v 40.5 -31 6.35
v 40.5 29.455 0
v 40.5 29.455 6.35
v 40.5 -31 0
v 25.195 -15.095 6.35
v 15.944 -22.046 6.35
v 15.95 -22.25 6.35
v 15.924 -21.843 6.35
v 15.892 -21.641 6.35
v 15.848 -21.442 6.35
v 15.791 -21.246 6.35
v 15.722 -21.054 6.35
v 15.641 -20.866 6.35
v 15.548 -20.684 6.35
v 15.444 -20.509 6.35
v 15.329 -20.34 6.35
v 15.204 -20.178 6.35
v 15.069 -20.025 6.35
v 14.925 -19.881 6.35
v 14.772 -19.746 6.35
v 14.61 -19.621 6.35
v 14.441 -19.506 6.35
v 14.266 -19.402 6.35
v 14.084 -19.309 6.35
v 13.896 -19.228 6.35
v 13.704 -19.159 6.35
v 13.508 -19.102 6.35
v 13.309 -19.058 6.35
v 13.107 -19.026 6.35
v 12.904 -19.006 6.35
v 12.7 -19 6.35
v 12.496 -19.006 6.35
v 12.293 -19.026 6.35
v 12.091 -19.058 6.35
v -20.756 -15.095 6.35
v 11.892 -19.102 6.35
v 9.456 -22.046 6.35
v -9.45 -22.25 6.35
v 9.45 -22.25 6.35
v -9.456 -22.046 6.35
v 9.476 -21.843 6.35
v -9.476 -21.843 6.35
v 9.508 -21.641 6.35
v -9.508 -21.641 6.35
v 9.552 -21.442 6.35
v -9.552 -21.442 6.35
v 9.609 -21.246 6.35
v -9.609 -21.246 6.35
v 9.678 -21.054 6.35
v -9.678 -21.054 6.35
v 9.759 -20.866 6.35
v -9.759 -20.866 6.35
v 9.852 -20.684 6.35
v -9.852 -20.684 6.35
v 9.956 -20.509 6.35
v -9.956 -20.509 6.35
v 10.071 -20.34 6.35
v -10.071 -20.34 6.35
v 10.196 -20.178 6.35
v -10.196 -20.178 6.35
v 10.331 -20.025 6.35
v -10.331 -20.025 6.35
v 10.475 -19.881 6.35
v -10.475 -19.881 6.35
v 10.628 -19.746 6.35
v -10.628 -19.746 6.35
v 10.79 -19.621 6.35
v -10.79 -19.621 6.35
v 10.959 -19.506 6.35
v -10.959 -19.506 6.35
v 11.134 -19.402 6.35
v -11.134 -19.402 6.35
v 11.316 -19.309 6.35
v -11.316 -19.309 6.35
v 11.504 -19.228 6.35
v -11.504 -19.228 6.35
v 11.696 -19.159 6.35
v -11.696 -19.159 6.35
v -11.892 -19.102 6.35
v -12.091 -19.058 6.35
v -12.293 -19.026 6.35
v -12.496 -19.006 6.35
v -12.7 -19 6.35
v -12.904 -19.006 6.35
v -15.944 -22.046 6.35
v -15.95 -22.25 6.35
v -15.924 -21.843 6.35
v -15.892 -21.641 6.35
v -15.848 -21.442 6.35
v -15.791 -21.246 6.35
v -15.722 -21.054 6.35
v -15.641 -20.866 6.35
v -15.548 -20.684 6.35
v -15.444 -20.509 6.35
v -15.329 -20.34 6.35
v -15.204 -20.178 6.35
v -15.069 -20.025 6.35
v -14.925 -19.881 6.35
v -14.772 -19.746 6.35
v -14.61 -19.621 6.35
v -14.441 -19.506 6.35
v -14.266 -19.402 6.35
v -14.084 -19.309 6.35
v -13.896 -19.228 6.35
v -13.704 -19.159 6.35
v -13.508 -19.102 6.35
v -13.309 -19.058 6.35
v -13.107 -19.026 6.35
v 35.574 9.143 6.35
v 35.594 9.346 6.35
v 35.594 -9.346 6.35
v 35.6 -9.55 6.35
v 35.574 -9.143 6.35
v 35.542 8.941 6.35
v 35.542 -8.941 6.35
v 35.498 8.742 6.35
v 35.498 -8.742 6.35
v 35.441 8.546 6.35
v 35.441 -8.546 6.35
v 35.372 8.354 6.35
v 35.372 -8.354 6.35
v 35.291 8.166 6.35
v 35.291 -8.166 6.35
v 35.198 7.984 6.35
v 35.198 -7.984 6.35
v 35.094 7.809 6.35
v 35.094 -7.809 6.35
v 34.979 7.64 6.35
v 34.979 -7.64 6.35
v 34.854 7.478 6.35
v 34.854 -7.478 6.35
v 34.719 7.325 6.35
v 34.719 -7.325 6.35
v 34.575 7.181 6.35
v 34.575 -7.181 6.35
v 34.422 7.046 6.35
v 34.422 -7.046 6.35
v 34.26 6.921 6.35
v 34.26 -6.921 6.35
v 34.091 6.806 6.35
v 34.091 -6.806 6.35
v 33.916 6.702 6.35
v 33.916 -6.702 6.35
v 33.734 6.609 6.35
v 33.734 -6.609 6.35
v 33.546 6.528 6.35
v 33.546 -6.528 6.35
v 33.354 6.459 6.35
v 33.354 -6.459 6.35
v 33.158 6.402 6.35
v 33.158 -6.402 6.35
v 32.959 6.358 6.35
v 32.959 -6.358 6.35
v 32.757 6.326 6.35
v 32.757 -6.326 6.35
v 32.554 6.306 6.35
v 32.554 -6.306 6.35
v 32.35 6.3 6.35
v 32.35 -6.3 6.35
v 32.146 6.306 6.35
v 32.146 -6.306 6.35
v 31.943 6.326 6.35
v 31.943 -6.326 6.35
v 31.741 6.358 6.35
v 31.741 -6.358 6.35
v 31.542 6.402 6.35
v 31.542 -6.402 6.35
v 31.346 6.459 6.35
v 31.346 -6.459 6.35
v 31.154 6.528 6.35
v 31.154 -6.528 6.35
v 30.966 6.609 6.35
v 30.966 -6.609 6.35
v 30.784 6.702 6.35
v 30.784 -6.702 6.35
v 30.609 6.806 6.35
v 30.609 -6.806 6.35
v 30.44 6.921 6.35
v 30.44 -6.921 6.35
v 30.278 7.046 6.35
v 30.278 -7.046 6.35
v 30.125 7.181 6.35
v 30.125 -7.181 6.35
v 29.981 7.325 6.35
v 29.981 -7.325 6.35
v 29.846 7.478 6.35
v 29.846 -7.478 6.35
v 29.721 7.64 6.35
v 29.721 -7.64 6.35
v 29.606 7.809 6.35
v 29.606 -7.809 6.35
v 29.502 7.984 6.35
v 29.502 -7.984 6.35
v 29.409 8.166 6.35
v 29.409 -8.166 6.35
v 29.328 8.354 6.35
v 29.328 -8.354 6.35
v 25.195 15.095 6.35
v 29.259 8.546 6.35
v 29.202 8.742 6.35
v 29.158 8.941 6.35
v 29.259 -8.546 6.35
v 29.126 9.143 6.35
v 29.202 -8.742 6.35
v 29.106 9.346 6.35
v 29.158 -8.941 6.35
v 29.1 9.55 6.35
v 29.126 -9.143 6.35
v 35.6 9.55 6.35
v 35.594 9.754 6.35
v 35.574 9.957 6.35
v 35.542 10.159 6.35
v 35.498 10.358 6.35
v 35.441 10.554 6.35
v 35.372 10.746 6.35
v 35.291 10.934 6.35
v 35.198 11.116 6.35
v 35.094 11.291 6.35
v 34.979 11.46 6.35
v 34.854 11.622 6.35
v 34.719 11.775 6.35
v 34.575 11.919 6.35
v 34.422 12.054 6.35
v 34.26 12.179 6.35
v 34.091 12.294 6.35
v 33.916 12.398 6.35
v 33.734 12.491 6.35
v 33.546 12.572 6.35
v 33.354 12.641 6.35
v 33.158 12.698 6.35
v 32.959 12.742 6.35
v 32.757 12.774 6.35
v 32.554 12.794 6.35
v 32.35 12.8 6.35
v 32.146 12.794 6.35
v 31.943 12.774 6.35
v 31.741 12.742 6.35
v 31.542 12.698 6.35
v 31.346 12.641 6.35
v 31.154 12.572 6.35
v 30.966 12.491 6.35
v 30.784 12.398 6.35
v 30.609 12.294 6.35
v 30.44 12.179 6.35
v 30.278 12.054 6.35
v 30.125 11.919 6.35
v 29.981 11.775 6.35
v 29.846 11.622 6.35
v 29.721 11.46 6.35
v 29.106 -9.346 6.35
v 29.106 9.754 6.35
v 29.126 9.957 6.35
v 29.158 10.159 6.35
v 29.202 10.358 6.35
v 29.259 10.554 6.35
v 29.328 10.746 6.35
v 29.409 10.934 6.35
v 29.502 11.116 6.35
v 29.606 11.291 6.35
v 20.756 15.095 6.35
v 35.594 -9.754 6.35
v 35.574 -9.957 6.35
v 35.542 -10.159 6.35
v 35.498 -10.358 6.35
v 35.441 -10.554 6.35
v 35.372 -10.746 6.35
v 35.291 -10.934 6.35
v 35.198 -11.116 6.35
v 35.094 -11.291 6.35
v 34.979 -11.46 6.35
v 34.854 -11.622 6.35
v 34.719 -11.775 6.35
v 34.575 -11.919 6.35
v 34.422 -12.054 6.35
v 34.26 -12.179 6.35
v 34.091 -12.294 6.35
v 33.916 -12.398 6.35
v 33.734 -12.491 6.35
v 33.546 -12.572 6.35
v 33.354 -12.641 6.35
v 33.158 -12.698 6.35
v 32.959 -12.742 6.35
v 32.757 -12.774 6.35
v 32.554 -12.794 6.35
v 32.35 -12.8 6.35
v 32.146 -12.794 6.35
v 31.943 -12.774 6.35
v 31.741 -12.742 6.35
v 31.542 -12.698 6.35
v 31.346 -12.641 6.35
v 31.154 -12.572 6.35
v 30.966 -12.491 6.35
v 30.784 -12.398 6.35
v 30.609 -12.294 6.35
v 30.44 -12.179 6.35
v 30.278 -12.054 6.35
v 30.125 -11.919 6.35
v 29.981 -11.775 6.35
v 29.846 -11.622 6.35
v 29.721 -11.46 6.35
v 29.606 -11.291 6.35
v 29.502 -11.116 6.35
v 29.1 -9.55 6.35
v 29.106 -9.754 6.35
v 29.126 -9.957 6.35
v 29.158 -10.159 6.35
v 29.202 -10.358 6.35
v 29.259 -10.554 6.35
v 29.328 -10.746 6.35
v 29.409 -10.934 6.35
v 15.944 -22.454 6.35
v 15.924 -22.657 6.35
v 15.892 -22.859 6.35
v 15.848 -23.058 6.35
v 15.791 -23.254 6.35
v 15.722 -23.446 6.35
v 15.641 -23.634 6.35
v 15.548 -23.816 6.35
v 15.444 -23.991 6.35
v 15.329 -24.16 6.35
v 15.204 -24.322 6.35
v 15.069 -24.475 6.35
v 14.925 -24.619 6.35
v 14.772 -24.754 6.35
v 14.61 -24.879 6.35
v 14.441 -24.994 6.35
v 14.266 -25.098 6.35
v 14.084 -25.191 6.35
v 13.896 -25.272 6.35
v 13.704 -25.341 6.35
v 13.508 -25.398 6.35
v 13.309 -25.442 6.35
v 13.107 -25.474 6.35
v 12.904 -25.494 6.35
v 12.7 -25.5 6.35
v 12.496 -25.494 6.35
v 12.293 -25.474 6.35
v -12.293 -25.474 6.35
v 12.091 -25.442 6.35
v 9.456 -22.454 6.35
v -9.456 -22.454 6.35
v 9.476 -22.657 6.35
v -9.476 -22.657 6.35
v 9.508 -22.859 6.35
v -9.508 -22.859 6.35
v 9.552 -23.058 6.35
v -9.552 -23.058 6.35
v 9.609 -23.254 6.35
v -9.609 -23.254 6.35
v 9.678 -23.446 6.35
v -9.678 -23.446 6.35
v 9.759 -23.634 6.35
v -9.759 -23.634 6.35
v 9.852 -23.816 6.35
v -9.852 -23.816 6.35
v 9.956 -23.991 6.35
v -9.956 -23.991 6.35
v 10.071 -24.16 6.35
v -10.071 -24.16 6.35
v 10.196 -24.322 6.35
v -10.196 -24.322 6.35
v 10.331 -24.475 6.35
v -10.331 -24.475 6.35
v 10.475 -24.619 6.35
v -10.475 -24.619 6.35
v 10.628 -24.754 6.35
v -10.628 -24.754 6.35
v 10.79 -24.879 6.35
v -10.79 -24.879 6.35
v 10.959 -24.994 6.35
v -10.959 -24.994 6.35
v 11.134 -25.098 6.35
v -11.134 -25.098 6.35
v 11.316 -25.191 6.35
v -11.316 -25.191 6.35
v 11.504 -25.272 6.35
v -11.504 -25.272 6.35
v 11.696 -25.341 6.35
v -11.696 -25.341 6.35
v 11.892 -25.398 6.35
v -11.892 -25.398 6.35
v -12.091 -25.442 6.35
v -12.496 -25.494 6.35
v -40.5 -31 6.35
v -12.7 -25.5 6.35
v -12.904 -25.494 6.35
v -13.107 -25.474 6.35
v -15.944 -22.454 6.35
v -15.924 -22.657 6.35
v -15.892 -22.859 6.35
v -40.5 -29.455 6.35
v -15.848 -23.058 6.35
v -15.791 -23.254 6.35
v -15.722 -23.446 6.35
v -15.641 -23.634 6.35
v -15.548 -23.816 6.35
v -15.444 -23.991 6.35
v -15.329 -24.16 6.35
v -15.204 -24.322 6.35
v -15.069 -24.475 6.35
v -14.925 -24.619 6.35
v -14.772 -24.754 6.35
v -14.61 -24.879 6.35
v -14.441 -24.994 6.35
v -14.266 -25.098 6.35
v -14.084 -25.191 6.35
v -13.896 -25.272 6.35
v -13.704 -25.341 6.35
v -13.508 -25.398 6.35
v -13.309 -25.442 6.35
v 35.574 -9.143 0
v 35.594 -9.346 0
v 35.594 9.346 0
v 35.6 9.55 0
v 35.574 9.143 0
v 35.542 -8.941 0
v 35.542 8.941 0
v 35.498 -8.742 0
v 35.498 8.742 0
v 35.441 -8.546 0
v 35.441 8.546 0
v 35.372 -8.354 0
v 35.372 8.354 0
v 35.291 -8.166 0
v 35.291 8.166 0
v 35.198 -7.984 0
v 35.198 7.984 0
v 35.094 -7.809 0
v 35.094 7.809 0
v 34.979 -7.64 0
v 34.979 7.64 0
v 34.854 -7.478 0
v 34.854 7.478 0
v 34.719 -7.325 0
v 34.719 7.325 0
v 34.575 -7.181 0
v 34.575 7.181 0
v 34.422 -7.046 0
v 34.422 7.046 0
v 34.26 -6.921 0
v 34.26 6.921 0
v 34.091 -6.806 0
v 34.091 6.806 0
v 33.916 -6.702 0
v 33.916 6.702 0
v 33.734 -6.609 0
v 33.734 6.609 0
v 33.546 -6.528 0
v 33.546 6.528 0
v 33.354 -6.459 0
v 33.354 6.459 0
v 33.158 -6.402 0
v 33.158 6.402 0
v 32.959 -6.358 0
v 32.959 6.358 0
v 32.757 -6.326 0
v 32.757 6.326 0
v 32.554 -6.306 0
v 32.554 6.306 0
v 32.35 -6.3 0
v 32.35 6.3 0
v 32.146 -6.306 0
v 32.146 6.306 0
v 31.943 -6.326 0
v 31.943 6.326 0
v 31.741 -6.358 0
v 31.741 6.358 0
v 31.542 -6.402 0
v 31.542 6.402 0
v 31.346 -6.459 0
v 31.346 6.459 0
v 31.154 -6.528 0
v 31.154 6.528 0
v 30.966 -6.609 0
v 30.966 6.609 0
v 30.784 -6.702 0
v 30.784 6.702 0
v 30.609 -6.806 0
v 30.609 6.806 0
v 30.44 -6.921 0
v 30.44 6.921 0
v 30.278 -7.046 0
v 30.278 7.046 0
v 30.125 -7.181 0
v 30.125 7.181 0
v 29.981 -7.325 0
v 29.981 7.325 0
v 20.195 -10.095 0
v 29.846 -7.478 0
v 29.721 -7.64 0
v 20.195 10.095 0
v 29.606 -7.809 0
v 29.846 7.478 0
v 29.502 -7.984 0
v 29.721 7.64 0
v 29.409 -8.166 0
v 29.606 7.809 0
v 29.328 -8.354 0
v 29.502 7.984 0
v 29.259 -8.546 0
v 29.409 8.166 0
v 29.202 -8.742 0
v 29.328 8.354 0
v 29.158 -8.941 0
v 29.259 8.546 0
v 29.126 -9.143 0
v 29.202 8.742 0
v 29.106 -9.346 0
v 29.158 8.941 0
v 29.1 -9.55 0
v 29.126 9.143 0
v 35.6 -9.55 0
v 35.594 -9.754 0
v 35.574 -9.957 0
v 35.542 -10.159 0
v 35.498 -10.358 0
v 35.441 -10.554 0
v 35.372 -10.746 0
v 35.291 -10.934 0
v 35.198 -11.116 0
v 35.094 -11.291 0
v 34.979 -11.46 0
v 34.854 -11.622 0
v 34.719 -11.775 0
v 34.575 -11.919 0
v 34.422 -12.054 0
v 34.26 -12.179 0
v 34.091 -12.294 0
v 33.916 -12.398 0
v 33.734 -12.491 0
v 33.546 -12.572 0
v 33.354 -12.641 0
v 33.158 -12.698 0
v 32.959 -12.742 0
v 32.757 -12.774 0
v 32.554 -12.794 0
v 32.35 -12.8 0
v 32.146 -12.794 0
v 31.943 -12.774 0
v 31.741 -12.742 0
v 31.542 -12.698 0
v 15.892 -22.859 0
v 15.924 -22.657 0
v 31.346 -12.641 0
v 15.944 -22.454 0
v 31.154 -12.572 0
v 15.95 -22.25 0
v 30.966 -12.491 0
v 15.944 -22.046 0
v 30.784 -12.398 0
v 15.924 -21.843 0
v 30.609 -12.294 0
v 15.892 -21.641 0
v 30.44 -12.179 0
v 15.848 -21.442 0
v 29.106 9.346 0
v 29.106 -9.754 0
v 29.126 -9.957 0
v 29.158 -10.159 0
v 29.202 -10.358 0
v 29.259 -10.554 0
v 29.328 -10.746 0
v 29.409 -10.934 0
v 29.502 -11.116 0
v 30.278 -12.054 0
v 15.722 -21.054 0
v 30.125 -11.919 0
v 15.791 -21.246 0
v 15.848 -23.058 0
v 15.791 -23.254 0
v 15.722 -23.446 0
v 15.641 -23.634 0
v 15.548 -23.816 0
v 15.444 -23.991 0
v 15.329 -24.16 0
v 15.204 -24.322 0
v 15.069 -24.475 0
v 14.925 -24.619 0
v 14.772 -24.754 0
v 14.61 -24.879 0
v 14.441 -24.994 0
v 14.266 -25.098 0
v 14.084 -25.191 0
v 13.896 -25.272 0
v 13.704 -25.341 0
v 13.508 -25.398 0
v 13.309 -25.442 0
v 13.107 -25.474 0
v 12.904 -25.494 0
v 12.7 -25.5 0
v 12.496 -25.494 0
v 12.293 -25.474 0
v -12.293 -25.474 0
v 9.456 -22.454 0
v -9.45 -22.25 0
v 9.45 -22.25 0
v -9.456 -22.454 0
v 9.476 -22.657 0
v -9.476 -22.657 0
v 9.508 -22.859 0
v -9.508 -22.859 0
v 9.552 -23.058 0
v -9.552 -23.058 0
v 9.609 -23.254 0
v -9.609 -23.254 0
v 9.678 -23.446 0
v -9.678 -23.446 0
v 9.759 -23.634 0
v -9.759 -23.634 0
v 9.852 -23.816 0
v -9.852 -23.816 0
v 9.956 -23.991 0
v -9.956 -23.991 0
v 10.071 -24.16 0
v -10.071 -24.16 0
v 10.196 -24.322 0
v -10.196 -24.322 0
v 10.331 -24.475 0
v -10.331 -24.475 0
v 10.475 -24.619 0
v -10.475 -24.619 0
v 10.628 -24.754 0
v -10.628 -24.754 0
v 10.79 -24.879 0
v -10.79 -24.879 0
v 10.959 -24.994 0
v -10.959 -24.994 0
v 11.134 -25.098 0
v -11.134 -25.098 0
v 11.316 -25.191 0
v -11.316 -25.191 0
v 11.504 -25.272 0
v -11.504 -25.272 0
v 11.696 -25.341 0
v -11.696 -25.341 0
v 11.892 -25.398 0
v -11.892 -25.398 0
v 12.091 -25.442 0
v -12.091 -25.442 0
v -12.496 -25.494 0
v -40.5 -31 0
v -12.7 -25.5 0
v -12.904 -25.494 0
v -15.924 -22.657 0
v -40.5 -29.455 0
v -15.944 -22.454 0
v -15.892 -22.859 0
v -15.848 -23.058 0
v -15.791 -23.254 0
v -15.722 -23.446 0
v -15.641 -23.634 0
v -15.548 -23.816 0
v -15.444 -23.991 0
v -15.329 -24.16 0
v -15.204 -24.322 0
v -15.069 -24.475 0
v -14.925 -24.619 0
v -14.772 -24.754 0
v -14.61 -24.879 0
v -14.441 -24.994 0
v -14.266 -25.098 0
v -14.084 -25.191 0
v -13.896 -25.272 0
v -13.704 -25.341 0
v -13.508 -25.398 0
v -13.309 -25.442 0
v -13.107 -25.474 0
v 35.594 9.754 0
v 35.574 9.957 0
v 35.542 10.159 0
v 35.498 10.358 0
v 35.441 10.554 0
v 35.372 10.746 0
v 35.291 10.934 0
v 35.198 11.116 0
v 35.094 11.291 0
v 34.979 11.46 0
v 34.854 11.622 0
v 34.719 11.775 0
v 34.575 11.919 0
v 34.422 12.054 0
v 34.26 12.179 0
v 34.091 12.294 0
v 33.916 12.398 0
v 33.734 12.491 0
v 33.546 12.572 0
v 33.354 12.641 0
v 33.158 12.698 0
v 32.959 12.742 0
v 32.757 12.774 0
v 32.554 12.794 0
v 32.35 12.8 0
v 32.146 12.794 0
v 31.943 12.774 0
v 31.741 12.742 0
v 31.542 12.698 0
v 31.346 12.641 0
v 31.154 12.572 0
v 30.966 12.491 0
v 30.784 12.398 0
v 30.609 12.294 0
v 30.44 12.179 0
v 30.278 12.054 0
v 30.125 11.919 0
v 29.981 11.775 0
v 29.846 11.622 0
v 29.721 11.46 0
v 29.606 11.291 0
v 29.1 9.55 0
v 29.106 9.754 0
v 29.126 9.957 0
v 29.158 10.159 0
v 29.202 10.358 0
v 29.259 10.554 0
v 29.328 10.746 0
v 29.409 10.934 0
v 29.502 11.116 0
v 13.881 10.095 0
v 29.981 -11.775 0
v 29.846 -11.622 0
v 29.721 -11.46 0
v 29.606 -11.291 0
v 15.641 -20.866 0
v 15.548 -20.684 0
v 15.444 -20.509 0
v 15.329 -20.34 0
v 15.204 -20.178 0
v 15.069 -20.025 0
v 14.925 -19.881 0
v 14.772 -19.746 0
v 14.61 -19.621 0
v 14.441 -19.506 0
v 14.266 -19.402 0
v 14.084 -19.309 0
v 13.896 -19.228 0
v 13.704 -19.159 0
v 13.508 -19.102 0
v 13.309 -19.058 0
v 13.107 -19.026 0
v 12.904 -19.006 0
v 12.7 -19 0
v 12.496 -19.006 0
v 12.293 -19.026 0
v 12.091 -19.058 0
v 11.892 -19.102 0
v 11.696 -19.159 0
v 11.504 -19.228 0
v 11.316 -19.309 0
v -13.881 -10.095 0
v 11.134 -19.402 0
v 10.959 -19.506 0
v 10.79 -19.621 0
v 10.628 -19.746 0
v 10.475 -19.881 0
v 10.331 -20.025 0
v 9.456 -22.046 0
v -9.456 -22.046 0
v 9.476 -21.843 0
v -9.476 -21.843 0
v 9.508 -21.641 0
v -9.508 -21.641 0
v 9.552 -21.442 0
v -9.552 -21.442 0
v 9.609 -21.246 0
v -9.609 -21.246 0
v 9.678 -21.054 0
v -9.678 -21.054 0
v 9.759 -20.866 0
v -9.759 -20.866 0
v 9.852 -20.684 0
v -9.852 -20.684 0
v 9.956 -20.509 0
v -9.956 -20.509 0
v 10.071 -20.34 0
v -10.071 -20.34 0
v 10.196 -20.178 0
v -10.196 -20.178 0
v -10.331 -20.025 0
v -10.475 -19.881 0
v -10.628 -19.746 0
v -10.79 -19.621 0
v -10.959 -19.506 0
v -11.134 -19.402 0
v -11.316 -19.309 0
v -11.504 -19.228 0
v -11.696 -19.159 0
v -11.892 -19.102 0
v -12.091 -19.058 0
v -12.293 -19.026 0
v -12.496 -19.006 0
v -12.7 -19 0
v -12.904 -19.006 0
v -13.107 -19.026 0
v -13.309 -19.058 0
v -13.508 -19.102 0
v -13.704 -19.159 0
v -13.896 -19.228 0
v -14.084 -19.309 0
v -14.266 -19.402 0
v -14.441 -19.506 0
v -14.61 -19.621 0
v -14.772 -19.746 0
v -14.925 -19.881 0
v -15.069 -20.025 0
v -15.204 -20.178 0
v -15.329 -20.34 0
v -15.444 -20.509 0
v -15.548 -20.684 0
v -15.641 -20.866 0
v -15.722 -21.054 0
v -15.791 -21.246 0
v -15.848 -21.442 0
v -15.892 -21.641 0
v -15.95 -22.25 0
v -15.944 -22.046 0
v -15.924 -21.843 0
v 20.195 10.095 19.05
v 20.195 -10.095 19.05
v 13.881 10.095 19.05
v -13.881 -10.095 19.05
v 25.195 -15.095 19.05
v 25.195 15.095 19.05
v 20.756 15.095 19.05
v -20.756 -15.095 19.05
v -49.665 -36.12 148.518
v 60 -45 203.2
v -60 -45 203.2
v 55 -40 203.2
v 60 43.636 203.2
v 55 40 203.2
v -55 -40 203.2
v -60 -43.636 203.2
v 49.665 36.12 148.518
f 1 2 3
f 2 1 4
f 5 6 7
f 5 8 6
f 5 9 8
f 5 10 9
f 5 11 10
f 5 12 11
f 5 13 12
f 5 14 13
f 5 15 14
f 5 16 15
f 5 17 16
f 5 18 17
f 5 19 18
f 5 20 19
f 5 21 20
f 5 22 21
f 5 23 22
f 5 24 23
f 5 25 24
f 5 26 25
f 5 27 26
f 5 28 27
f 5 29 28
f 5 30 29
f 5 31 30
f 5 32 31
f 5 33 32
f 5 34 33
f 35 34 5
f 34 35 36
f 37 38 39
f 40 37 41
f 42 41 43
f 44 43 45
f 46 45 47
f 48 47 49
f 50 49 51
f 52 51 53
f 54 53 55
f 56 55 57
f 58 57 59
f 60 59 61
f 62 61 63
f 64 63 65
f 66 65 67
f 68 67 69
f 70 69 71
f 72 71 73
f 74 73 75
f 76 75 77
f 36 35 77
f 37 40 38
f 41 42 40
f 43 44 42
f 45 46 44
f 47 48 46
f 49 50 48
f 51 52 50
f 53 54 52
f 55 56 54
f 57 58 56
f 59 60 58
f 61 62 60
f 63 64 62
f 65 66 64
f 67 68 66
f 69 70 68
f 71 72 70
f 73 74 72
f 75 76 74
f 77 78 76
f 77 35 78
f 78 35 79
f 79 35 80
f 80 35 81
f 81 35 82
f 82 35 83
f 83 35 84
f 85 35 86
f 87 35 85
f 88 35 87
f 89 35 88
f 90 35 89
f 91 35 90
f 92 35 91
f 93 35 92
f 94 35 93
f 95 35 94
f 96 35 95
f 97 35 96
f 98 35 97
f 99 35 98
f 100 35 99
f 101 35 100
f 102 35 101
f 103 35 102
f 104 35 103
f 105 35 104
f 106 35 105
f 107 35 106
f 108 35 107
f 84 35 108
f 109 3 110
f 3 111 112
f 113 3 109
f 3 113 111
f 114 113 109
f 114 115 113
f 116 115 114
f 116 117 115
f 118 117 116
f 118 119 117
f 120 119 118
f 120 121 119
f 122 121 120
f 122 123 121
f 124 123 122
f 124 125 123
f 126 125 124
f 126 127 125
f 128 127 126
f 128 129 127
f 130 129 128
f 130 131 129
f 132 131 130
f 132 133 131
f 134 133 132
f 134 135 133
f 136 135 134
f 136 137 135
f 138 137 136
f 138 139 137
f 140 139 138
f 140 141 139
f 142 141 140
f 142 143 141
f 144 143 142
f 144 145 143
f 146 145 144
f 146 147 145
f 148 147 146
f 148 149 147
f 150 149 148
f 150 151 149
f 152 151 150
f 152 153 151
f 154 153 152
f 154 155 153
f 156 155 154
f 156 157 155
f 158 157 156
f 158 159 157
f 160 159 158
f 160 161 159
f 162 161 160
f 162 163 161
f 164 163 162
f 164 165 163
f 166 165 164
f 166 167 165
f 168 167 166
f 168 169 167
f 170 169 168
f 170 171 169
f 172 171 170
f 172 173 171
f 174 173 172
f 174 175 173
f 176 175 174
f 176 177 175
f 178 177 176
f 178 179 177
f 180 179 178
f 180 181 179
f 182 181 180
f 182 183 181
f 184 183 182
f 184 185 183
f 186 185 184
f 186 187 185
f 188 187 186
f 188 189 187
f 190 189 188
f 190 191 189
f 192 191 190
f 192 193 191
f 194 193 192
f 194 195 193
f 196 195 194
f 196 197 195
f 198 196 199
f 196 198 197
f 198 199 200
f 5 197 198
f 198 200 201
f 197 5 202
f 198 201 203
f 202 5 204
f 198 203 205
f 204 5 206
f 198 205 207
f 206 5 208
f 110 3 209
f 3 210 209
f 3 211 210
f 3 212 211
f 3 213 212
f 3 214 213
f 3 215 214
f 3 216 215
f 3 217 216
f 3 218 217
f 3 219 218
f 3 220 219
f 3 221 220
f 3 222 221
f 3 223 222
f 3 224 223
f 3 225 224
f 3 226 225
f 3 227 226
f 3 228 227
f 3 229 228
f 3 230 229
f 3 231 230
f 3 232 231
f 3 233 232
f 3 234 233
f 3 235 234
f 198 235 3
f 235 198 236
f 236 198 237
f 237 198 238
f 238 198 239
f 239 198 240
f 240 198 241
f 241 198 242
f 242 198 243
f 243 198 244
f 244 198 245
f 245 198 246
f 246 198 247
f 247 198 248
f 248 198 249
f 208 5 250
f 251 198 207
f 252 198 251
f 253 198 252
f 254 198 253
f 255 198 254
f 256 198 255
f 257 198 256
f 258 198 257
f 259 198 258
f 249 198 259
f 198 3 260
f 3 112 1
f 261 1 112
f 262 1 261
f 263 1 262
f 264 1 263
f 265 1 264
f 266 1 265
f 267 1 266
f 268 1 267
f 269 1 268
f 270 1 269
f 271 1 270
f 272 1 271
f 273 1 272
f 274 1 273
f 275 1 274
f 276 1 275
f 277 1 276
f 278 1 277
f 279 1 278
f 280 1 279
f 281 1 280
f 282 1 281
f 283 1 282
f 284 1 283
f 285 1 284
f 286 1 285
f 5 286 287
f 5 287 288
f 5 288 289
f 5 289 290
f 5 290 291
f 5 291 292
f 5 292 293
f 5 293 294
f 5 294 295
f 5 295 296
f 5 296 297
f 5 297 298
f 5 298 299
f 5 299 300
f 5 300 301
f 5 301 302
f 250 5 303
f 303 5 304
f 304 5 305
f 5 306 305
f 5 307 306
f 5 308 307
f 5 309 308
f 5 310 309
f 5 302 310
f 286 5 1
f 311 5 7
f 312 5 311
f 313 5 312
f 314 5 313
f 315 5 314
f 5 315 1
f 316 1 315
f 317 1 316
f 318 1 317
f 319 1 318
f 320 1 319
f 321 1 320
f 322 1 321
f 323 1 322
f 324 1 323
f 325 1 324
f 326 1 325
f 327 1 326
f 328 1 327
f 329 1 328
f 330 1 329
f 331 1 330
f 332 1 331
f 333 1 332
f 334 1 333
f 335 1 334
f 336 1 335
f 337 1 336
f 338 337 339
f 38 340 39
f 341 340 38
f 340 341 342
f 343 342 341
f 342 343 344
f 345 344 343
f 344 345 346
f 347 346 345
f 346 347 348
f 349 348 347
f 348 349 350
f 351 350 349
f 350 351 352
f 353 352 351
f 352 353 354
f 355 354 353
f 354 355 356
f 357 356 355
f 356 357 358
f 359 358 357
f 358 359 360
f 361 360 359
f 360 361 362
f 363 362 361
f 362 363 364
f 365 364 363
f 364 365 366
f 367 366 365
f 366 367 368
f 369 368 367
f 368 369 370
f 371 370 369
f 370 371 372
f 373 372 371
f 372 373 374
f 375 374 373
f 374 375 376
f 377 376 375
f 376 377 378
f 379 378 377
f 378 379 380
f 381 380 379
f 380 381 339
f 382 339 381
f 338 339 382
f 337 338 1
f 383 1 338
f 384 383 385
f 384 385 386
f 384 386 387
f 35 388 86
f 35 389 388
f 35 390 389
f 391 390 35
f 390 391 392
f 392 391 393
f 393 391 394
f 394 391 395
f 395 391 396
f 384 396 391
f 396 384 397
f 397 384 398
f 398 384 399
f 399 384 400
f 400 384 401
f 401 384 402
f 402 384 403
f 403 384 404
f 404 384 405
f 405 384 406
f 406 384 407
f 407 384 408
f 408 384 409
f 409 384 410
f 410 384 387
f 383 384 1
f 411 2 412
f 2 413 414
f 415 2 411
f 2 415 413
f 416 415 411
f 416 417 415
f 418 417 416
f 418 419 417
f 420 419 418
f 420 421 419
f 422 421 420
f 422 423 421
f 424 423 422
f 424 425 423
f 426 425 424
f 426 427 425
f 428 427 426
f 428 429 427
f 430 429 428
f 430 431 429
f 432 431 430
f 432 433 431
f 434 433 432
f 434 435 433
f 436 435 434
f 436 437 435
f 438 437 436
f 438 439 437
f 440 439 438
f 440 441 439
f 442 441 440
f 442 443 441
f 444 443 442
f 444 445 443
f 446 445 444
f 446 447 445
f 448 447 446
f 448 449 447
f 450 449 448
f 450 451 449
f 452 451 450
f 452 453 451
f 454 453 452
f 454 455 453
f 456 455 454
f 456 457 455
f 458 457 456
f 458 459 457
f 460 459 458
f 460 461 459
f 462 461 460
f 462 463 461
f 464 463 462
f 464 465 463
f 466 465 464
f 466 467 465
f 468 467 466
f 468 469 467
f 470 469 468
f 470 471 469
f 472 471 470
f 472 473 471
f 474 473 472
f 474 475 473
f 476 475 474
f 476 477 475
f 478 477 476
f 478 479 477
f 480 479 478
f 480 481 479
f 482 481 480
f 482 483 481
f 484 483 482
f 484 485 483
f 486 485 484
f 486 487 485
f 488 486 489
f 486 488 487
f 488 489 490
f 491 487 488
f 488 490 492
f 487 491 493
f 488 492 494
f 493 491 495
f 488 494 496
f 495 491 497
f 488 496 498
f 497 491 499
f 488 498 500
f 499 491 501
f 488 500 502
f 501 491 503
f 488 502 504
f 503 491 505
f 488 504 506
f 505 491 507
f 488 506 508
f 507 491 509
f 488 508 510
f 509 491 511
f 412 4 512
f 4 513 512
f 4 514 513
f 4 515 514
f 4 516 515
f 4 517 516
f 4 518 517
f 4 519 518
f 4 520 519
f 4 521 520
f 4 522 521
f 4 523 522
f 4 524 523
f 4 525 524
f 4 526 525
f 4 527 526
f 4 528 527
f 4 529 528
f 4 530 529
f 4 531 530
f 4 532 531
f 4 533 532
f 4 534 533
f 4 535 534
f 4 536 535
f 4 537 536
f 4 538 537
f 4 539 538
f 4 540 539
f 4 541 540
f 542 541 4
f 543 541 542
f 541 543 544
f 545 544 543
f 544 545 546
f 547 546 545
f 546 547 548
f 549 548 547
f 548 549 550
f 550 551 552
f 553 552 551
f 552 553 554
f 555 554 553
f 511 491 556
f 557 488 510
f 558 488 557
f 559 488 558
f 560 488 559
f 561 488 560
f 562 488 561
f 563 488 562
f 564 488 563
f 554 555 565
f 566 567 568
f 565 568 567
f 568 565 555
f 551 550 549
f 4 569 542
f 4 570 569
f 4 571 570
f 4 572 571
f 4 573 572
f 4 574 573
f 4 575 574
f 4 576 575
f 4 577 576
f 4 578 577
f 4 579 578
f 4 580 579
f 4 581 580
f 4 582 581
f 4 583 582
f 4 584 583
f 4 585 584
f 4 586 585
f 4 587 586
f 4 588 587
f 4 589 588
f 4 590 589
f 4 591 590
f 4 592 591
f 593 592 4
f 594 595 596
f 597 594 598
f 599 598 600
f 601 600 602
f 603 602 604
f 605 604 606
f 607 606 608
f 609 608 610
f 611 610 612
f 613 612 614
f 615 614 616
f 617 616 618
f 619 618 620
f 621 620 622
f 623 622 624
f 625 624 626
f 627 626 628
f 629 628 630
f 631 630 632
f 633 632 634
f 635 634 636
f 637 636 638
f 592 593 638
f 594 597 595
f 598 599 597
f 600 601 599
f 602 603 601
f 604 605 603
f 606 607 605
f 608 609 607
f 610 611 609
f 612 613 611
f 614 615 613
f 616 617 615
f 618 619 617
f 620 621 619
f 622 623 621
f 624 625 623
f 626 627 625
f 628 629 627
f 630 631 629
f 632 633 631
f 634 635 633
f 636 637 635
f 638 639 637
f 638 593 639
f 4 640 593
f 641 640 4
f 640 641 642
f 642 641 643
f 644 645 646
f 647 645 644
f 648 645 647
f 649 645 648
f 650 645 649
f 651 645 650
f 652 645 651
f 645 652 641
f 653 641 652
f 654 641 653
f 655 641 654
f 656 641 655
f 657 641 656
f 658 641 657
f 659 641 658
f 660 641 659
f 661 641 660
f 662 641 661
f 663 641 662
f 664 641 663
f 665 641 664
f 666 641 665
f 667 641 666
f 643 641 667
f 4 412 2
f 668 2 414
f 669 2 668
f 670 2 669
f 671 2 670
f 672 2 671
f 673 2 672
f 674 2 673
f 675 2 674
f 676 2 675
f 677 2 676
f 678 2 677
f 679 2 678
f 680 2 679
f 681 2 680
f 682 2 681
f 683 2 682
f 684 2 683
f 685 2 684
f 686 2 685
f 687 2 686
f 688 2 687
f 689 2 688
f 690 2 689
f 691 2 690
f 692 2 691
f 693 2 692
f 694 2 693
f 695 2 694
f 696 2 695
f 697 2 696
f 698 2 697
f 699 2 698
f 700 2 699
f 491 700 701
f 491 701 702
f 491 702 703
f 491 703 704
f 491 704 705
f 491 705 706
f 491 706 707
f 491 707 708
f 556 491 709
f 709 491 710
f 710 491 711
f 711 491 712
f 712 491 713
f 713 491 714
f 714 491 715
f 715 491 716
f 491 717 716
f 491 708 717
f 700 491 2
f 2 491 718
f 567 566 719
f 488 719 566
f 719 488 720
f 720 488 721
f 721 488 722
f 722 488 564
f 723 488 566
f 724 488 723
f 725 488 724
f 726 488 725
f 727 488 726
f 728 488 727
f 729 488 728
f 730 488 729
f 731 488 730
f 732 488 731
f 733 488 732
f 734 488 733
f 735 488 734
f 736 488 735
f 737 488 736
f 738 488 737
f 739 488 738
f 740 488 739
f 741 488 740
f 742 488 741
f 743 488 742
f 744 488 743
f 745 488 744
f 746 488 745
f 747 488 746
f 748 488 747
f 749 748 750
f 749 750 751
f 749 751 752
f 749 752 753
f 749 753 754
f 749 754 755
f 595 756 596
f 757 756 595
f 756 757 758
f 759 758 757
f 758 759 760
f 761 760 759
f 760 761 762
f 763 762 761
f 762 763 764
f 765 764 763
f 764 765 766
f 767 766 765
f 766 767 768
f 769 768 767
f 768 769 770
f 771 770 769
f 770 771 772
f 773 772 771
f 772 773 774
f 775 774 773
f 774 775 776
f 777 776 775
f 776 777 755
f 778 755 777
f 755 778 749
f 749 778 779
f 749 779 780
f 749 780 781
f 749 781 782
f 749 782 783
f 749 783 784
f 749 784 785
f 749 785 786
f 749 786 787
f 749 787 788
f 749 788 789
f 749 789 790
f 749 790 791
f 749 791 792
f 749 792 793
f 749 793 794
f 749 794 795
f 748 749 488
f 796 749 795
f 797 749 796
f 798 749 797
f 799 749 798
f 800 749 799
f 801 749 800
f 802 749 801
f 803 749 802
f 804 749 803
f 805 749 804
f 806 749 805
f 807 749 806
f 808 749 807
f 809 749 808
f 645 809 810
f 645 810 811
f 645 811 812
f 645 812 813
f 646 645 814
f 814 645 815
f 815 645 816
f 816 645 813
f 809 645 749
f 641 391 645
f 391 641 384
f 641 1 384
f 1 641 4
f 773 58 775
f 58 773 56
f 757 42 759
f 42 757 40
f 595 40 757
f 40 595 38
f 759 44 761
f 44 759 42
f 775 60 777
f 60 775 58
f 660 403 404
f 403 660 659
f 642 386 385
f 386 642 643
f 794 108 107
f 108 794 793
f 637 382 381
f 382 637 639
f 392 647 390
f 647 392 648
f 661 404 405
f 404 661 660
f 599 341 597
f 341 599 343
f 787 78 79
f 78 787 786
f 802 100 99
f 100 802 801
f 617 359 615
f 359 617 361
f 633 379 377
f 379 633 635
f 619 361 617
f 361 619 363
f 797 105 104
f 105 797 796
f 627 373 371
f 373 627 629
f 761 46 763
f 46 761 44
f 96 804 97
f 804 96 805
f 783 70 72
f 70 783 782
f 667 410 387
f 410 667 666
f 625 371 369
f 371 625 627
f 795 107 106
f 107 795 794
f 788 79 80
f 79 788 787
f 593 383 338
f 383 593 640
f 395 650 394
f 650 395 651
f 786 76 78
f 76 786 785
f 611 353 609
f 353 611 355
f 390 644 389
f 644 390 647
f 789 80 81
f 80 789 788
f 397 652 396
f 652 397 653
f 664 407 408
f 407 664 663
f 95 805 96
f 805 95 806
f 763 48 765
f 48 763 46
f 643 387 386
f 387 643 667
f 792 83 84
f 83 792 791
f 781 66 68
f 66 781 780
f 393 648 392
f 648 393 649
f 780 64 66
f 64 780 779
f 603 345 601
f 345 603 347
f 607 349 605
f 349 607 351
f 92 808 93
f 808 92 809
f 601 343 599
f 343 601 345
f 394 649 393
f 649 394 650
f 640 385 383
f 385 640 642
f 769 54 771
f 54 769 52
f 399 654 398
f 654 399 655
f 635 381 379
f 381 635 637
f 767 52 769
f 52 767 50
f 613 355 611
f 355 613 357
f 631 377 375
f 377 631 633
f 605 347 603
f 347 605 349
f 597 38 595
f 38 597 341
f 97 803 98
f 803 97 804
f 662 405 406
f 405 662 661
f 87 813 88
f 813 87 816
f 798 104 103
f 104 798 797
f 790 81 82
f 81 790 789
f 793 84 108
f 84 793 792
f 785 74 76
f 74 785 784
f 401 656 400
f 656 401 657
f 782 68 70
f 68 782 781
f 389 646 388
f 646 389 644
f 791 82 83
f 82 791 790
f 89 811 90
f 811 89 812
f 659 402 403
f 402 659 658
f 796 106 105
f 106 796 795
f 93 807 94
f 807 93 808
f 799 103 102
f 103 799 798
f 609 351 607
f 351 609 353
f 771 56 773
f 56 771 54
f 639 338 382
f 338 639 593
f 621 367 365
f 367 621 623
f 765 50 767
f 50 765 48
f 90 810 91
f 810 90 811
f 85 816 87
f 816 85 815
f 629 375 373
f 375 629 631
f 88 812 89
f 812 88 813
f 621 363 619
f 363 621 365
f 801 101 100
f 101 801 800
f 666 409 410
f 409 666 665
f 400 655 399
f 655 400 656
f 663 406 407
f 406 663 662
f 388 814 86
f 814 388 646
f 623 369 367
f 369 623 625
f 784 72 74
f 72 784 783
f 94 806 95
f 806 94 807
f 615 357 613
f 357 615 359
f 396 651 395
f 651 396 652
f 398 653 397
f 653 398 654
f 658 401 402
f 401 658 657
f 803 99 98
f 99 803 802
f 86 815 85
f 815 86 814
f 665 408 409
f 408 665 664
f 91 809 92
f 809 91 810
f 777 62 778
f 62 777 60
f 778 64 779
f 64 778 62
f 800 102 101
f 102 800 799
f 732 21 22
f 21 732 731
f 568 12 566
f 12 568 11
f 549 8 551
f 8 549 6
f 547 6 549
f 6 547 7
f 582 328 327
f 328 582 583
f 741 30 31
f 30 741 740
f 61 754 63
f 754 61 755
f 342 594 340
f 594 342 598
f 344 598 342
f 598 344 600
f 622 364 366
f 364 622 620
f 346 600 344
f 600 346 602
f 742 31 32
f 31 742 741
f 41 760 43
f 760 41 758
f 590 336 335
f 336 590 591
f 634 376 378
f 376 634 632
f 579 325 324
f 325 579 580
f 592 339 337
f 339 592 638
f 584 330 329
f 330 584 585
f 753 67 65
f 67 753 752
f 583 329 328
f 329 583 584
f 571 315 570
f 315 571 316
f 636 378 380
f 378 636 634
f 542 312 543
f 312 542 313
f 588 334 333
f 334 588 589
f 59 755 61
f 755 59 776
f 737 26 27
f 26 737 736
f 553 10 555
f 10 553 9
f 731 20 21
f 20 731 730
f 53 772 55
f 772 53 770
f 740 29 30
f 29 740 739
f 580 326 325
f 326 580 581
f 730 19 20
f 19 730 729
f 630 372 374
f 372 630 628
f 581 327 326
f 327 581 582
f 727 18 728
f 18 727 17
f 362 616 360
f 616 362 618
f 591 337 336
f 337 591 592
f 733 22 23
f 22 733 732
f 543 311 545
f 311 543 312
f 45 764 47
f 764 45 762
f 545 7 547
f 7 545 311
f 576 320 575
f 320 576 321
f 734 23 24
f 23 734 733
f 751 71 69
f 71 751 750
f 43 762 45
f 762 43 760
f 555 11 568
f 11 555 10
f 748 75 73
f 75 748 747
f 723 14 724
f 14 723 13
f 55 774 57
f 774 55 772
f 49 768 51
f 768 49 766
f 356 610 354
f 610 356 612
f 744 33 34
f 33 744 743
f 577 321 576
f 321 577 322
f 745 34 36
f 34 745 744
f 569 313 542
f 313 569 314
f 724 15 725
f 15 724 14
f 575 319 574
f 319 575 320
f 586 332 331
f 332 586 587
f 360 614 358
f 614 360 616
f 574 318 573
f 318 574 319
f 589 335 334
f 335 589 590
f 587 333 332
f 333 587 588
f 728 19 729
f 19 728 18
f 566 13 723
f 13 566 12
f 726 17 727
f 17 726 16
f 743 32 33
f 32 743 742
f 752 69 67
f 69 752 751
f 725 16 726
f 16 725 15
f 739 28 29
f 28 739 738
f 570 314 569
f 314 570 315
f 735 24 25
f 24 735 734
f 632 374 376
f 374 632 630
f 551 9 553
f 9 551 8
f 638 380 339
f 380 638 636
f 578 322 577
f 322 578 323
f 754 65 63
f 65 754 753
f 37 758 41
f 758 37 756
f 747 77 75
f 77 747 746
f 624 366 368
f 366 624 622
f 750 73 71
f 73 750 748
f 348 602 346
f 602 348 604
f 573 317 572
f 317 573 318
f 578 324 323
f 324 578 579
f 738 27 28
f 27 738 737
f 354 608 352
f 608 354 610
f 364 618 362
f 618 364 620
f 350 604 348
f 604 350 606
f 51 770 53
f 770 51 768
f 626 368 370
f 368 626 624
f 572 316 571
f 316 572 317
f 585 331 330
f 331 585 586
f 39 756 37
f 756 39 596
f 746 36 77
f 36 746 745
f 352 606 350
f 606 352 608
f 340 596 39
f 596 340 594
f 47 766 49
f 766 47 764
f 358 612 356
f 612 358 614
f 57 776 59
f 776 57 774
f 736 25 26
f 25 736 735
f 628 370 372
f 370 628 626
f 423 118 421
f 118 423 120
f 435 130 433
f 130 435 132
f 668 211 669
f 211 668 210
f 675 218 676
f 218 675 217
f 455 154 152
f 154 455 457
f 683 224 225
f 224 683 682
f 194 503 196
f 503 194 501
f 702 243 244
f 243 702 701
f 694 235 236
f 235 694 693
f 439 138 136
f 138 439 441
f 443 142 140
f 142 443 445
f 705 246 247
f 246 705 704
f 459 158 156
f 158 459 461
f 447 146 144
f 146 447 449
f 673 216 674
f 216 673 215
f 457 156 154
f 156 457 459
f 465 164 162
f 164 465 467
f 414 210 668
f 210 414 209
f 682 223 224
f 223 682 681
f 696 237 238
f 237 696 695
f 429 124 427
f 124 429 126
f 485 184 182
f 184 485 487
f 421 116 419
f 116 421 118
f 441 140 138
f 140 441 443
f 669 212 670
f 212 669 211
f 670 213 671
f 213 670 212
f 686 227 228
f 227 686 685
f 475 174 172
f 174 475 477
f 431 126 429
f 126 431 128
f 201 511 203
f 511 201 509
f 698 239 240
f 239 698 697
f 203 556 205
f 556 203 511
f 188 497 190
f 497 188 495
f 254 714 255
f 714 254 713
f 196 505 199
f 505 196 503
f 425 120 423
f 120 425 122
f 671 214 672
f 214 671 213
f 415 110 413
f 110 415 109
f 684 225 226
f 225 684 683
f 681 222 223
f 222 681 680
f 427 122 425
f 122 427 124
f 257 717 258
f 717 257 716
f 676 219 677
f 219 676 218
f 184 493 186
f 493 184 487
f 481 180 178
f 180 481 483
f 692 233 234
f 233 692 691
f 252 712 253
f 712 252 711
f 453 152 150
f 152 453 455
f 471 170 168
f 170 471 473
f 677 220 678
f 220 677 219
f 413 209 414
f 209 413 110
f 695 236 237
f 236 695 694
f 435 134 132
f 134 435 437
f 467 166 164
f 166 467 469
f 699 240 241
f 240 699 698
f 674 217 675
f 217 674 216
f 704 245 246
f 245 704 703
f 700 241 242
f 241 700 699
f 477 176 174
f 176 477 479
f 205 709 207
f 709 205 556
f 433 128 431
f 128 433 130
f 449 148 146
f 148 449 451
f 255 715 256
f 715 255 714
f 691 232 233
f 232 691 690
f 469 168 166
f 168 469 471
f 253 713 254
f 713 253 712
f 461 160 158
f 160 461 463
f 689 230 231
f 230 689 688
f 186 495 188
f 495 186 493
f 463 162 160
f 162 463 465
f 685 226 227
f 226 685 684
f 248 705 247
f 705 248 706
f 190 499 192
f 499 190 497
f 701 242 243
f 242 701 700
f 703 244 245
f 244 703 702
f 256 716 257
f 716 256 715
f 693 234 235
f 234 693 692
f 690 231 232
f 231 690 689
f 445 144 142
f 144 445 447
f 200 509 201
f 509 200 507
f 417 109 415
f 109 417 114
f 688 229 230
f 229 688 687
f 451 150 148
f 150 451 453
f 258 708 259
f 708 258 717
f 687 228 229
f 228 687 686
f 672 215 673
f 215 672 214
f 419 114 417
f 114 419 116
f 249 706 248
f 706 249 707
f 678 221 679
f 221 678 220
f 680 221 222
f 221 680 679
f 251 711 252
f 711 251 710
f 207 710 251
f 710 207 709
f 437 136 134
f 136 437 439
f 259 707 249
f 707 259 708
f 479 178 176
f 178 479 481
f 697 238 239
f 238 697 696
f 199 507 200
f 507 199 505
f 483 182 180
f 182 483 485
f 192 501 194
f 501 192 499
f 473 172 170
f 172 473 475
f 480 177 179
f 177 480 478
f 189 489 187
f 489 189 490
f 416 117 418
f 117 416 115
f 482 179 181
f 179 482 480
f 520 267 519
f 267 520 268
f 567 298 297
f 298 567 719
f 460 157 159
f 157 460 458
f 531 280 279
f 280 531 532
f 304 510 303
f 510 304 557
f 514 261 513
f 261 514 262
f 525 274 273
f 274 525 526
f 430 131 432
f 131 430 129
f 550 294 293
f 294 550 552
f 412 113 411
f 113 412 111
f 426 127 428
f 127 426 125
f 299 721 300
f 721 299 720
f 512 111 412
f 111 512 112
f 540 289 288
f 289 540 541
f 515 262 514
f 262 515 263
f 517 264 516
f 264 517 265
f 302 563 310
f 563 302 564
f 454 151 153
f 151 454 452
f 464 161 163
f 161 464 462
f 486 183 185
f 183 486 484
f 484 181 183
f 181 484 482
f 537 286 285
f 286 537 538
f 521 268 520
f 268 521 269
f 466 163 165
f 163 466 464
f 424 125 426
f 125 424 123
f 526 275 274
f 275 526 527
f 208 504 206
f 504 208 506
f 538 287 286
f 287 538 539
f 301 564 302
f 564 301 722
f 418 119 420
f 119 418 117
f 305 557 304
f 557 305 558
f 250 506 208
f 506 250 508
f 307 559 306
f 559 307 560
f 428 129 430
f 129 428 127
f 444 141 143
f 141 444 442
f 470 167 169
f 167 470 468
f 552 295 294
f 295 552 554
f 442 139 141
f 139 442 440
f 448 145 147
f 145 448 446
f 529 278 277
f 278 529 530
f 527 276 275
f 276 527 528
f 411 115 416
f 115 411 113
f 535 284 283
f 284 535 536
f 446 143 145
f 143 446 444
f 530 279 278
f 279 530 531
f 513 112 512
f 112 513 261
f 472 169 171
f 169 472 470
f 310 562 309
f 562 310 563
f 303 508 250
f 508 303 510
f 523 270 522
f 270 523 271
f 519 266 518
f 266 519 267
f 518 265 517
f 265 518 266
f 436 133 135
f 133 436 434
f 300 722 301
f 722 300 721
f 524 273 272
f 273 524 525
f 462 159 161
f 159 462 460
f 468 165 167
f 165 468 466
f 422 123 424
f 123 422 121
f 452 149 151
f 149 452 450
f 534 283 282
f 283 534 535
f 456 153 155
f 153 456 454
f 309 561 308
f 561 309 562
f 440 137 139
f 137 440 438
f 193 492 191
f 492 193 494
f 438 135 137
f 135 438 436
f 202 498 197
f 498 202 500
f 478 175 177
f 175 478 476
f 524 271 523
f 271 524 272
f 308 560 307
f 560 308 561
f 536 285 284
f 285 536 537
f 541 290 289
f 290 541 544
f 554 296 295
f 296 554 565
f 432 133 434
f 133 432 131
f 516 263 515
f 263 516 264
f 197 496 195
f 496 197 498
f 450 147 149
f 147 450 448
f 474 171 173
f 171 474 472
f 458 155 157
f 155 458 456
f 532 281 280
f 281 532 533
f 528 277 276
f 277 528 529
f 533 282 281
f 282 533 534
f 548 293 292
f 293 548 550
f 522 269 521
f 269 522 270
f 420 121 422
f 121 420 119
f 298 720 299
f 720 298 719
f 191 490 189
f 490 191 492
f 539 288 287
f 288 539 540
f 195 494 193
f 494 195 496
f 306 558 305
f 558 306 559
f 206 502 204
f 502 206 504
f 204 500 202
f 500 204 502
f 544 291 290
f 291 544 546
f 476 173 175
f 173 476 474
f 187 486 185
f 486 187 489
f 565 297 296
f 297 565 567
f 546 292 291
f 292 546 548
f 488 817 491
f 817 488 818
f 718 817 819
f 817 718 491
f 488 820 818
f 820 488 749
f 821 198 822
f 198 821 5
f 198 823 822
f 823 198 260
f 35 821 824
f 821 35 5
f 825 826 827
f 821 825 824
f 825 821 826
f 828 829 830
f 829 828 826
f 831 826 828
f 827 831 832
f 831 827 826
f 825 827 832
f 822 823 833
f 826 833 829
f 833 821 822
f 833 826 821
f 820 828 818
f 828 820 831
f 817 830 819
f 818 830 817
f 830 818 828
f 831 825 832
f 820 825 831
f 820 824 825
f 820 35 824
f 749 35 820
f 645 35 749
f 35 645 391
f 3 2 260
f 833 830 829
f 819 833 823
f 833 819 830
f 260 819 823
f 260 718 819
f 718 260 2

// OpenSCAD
base_width = 81.0;
base_height = 62.0;
base_thickness = 6.35;
hole_diam = 6.5;
right_hole_y_offset = 19.1 / 2;
right_hole_x_offset = 64.7 / 2;
top_hole_x_offset = 25.4 / 2;
top_hole_y_offset = 44.5 / 2;
flange_width = 40.39;
flange_height = 20.19;
thickness = 5;
sec1_length = 2 * base_thickness;
sec2_width = 110.0;
sec2_height = 80.0;
sec2_zmax = 203.2;

difference()
{
	union()
	{
		// base
		difference()
		{
			// base
			translate([ -base_width / 2, -base_height / 2, 0 ])
			{
				cube([ base_width, base_height, base_thickness ]);
			}
			// top and bottom screw holes
			translate([ -top_hole_x_offset, -top_hole_y_offset, -0.1 ])
			{
				cylinder(h = base_thickness + 0.2, d = hole_diam, $fn = 100);
			}
			translate([ -top_hole_x_offset, top_hole_y_offset, -0.1 ])
			{
				cylinder(h = base_thickness + 0.2, d = hole_diam, $fn = 100);
			}
			translate([ top_hole_x_offset, top_hole_y_offset, -0.1 ])
			{
				cylinder(h = base_thickness + 0.2, d = hole_diam, $fn = 100);
			}
			translate([ top_hole_x_offset, -top_hole_y_offset, -0.1 ])
			{
				cylinder(h = base_thickness + 0.2, d = hole_diam, $fn = 100);
			}
			// left and right screw holes
			translate([ right_hole_x_offset, right_hole_y_offset, -0.1 ])
			{
				cylinder(h = base_thickness + 0.2, d = hole_diam, $fn = 100);
			}
			translate([ -right_hole_x_offset, right_hole_y_offset, -0.1 ])
			{
				cylinder(h = base_thickness + 0.2, d = hole_diam, $fn = 100);
			}
			translate([ right_hole_x_offset, -right_hole_y_offset, -0.1 ])
			{
				cylinder(h = base_thickness + 0.2, d = hole_diam, $fn = 100);
			}
			translate([ -right_hole_x_offset, -right_hole_y_offset, -0.1 ])
			{
				cylinder(h = base_thickness + 0.2, d = hole_diam, $fn = 100);
			}
			// flange
			translate([ -flange_width / 2, -flange_height / 2, -0.1 ])
			{
				cube([ flange_width, flange_height, base_thickness + 0.2 ]);
			}
		}

		// section 1
		difference()
		{
			translate([
				-flange_width / 2 - thickness, -flange_height / 2 - thickness,
				base_thickness
			])
			{
				cube([
					flange_width + 2 * thickness, flange_height + 2 * thickness,
					sec1_length
				]);
			}
			translate([ -flange_width / 2, -flange_height / 2, base_thickness - 0.1 ])
			{
				cube([ flange_width, flange_height, sec1_length + 0.2 ]);
			}
		}

		// section 2
		points_outer = [
			[
				-flange_width / 2 - thickness, -flange_height / 2 - thickness,
				base_thickness +
				sec1_length
			],
			[
				-flange_width / 2 - thickness, flange_height / 2 + thickness,
				base_thickness +
				sec1_length
			],
			[
				flange_width / 2 + thickness, flange_height / 2 + thickness,
				base_thickness +
				sec1_length
			],
			[
				flange_width / 2 + thickness, -flange_height / 2 - thickness,
				sec1_length +
				base_thickness
			],
			[ -sec2_width / 2 - thickness, -sec2_height / 2 - thickness, sec2_zmax ],
			[ -sec2_width / 2 - thickness, sec2_height / 2 + thickness, sec2_zmax ],
			[ sec2_width / 2 + thickness, sec2_height / 2 + thickness, sec2_zmax ],
			[ sec2_width / 2 + thickness, -sec2_height / 2 - thickness, sec2_zmax ]
		];

		points_inner = [
			[ -flange_width / 2, -flange_height / 2, base_thickness + sec1_length ],
			[ -flange_width / 2, flange_height / 2, base_thickness + sec1_length ],
			[ flange_width / 2, flange_height / 2, base_thickness + sec1_length ],
			[ flange_width / 2, -flange_height / 2, base_thickness + sec1_length ],
			[ -sec2_width / 2, -sec2_height / 2, sec2_zmax ],
			[ -sec2_width / 2, sec2_height / 2, sec2_zmax ],
			[ sec2_width / 2, sec2_height / 2, sec2_zmax ],
			[ sec2_width / 2, -sec2_height / 2, sec2_zmax ]
		];

		difference()
		{
			polyhedron(points_outer, faces = [
				[ 0, 4, 7, 3 ], [ 1, 5, 4, 0 ], [ 2, 6, 5, 1 ], [ 3, 7, 6, 2 ],
				[ 3, 2, 1, 0 ], [ 4, 5, 6, 7 ]
			]);
			polyhedron(points_inner, faces = [
				[ 3, 7, 4, 0 ], [ 0, 4, 5, 1 ], [ 1, 5, 6, 2 ], [ 2, 6, 7, 3 ],
				[ 0, 1, 2, 3 ], [ 7, 6, 5, 4 ]
			]);
		}
	}
	rotate([ 0, 0, atan(sec2_height / sec2_width) ])
	{
		translate([ -2 * sqrt(pow(sec2_width, 2) + pow(sec2_height, 2)) / 2, 0, 0 ])
		{
			cube([
				2 * sqrt(pow(sec2_width, 2) + pow(sec2_height, 2)), sec2_width,
				sec2_zmax
			]);
		}
	}
}
